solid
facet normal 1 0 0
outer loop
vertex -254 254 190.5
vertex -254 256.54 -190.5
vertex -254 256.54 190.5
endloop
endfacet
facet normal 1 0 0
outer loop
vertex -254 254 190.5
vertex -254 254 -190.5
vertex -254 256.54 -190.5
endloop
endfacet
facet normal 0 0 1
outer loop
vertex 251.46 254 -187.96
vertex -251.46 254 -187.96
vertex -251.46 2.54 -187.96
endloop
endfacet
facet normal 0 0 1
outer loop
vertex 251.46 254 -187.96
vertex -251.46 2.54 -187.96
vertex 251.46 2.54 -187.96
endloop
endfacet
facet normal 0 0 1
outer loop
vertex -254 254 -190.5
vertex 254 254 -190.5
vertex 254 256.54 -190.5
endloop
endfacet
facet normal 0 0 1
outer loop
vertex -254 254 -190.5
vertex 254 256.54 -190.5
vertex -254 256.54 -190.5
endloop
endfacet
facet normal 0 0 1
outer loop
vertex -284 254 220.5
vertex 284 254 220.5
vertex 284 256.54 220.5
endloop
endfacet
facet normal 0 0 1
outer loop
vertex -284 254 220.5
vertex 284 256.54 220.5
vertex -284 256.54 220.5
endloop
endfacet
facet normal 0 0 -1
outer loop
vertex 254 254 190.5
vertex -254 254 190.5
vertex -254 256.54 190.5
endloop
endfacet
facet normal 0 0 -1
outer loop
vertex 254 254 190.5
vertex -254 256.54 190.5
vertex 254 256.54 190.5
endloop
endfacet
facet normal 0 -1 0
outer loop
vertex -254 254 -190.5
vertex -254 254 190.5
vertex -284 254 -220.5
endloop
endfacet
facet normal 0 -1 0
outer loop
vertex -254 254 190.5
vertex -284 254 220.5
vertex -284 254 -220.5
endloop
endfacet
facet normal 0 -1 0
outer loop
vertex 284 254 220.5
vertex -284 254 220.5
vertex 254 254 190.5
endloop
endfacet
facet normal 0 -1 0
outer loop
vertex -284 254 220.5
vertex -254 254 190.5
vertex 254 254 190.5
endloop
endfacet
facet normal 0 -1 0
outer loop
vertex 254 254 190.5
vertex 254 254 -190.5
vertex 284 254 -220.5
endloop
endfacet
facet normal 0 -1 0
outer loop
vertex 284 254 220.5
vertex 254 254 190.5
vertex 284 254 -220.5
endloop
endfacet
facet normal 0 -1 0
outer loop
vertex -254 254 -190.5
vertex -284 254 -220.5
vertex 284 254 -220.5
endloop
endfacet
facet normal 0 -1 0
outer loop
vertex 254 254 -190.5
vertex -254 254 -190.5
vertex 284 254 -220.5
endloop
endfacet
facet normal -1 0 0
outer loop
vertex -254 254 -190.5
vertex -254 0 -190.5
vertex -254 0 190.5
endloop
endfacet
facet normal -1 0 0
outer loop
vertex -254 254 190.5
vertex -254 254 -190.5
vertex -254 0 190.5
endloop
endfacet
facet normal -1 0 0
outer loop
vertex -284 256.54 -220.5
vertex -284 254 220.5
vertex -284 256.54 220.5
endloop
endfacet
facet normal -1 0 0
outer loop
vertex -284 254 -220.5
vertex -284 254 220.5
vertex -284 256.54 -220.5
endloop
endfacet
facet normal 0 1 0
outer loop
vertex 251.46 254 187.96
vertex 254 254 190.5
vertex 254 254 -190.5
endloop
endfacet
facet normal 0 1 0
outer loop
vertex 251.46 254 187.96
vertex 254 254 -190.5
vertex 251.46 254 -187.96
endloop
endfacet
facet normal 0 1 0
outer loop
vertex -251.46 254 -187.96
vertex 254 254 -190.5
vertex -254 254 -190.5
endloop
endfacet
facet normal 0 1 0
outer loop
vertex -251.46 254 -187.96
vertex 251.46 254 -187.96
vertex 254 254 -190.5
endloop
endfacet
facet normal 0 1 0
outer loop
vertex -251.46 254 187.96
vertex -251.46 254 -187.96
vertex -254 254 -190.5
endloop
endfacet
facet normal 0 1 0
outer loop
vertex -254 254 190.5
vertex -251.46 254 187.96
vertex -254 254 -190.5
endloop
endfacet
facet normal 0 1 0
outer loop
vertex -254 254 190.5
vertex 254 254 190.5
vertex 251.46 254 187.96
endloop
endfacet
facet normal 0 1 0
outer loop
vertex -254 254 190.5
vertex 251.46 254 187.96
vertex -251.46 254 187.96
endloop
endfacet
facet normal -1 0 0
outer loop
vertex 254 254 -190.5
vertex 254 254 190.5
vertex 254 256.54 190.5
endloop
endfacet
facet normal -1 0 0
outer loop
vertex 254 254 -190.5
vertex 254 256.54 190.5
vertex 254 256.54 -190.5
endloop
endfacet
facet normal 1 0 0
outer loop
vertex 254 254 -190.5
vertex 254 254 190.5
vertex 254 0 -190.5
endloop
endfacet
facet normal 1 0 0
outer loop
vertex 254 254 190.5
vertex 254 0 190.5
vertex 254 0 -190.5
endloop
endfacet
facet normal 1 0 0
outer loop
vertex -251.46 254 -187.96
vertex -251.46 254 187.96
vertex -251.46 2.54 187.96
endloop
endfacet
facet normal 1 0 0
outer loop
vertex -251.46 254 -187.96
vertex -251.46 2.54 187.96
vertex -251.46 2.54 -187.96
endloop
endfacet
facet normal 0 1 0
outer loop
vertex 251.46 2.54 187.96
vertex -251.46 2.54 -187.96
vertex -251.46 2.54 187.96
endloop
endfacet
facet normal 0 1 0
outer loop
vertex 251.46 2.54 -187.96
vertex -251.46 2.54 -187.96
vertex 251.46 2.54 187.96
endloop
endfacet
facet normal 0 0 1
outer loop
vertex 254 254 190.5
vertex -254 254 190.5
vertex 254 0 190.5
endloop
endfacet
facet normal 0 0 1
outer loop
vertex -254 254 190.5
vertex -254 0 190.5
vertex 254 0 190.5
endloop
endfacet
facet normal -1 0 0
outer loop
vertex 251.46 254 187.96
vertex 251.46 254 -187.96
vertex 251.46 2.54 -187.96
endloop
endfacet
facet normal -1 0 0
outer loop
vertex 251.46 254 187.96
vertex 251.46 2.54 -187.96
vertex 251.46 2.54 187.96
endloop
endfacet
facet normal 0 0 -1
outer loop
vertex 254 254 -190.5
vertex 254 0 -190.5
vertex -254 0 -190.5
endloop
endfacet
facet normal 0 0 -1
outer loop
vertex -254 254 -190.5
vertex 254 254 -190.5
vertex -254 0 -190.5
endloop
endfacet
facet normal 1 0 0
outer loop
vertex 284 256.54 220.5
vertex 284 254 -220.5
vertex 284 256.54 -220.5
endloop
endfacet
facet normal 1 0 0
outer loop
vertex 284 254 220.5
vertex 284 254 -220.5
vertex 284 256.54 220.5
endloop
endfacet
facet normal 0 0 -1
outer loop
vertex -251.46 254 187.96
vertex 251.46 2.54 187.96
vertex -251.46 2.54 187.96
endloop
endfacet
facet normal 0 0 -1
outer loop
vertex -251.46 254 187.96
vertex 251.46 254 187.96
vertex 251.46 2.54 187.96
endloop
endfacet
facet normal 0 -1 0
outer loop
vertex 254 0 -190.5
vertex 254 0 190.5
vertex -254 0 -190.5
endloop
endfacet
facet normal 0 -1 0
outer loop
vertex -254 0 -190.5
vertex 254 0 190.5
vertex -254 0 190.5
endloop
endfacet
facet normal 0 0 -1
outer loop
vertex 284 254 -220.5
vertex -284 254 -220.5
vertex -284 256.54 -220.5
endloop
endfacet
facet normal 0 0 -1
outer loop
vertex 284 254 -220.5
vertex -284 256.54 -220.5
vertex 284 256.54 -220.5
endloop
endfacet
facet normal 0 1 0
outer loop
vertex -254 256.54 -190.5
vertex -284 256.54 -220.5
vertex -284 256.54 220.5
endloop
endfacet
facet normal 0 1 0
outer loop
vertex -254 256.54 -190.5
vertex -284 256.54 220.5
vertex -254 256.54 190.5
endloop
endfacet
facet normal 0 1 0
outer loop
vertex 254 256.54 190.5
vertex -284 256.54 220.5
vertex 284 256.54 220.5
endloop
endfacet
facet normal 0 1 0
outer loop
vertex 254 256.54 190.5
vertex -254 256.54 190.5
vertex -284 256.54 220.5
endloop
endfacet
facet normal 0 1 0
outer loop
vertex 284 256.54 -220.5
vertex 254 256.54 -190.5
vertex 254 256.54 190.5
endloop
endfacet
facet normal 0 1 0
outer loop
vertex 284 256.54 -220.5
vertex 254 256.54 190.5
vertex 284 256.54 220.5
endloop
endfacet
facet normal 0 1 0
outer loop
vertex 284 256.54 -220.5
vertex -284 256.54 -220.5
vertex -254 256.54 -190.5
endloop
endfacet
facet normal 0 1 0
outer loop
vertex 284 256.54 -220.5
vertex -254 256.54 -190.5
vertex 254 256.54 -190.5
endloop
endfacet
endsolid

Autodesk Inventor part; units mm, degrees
ref_plane "YZ Plane" through (0, 0, 0) normal (1, 0, 0) x (0, 1, 0)
ref_plane "XZ Plane" through (0, 0, 0) normal (0, 1, 0) x (-1, 0, 0)
ref_plane "XY Plane" through (0, 0, 0) normal (0, 0, 1) x (1, 0, 0)
sketch "Sketch1" plane through (0, 0, 0) normal (0, 1, 0) x (-1, 0, 0)
  line L0 (-254, -190.5) -> (254, -190.5)
  line L1 (254, -190.5) -> (254, 190.5)
  line L2 (254, 190.5) -> (-254, 190.5)
  line L3 (-254, 190.5) -> (-254, -190.5)
  line L4 (-254, -190.5) -> (254, 190.5) construction
  line L5 (254, -190.5) -> (-254, 190.5) construction
  point P0 (0, 0)
  dimension "d0" = 508
  dimension "d1" = 381
extrude "Extrusion1" add sketch "Sketch1" along normal blind 254
sketch "Sketch2" plane through (0, 254, 0) normal (0, 1, 0) x (1, 0, 0)
  line L0 (254, 190.5) -> (-254, 190.5) projected
  line L1 (-254, 190.5) -> (-254, -190.5) projected
  line L2 (-254, -190.5) -> (254, -190.5) projected
  line L3 (254, -190.5) -> (254, 190.5) projected
  line L4 (-284, 220.5) -> (284, 220.5)
  line L5 (284, 220.5) -> (284, -220.5)
  line L6 (284, -220.5) -> (-284, -220.5)
  line L7 (-284, -220.5) -> (-284, 220.5)
  point P0 (0, 0)
  dimension "d4" = 30
extrude "Extrusion2" add sketch "Sketch2" along normal blind 2.54
sketch "Sketch4" plane through (0, 254, 0) normal (0, 1, 0) x (1, 0, 0)
  line L0 (254, 190.5) -> (-254, 190.5) projected
  line L1 (-254, 190.5) -> (-254, -190.5) projected
  line L2 (-254, -190.5) -> (254, -190.5) projected
  line L3 (254, -190.5) -> (254, 190.5) projected
  line L4 (-251.46, 187.96) -> (251.46, 187.96)
  line L5 (251.46, 187.96) -> (251.46, -187.96)
  line L6 (251.46, -187.96) -> (-251.46, -187.96)
  line L7 (-251.46, -187.96) -> (-251.46, 187.96)
  point P0 (0, 0)
  dimension "d9" = 2.54
extrude "Extrusion4" cut sketch "Sketch4" against normal blind 251.46 contours L4 L5 L6 L7
properties part number "dcps_mcpc" material "Copper, Alloy"
